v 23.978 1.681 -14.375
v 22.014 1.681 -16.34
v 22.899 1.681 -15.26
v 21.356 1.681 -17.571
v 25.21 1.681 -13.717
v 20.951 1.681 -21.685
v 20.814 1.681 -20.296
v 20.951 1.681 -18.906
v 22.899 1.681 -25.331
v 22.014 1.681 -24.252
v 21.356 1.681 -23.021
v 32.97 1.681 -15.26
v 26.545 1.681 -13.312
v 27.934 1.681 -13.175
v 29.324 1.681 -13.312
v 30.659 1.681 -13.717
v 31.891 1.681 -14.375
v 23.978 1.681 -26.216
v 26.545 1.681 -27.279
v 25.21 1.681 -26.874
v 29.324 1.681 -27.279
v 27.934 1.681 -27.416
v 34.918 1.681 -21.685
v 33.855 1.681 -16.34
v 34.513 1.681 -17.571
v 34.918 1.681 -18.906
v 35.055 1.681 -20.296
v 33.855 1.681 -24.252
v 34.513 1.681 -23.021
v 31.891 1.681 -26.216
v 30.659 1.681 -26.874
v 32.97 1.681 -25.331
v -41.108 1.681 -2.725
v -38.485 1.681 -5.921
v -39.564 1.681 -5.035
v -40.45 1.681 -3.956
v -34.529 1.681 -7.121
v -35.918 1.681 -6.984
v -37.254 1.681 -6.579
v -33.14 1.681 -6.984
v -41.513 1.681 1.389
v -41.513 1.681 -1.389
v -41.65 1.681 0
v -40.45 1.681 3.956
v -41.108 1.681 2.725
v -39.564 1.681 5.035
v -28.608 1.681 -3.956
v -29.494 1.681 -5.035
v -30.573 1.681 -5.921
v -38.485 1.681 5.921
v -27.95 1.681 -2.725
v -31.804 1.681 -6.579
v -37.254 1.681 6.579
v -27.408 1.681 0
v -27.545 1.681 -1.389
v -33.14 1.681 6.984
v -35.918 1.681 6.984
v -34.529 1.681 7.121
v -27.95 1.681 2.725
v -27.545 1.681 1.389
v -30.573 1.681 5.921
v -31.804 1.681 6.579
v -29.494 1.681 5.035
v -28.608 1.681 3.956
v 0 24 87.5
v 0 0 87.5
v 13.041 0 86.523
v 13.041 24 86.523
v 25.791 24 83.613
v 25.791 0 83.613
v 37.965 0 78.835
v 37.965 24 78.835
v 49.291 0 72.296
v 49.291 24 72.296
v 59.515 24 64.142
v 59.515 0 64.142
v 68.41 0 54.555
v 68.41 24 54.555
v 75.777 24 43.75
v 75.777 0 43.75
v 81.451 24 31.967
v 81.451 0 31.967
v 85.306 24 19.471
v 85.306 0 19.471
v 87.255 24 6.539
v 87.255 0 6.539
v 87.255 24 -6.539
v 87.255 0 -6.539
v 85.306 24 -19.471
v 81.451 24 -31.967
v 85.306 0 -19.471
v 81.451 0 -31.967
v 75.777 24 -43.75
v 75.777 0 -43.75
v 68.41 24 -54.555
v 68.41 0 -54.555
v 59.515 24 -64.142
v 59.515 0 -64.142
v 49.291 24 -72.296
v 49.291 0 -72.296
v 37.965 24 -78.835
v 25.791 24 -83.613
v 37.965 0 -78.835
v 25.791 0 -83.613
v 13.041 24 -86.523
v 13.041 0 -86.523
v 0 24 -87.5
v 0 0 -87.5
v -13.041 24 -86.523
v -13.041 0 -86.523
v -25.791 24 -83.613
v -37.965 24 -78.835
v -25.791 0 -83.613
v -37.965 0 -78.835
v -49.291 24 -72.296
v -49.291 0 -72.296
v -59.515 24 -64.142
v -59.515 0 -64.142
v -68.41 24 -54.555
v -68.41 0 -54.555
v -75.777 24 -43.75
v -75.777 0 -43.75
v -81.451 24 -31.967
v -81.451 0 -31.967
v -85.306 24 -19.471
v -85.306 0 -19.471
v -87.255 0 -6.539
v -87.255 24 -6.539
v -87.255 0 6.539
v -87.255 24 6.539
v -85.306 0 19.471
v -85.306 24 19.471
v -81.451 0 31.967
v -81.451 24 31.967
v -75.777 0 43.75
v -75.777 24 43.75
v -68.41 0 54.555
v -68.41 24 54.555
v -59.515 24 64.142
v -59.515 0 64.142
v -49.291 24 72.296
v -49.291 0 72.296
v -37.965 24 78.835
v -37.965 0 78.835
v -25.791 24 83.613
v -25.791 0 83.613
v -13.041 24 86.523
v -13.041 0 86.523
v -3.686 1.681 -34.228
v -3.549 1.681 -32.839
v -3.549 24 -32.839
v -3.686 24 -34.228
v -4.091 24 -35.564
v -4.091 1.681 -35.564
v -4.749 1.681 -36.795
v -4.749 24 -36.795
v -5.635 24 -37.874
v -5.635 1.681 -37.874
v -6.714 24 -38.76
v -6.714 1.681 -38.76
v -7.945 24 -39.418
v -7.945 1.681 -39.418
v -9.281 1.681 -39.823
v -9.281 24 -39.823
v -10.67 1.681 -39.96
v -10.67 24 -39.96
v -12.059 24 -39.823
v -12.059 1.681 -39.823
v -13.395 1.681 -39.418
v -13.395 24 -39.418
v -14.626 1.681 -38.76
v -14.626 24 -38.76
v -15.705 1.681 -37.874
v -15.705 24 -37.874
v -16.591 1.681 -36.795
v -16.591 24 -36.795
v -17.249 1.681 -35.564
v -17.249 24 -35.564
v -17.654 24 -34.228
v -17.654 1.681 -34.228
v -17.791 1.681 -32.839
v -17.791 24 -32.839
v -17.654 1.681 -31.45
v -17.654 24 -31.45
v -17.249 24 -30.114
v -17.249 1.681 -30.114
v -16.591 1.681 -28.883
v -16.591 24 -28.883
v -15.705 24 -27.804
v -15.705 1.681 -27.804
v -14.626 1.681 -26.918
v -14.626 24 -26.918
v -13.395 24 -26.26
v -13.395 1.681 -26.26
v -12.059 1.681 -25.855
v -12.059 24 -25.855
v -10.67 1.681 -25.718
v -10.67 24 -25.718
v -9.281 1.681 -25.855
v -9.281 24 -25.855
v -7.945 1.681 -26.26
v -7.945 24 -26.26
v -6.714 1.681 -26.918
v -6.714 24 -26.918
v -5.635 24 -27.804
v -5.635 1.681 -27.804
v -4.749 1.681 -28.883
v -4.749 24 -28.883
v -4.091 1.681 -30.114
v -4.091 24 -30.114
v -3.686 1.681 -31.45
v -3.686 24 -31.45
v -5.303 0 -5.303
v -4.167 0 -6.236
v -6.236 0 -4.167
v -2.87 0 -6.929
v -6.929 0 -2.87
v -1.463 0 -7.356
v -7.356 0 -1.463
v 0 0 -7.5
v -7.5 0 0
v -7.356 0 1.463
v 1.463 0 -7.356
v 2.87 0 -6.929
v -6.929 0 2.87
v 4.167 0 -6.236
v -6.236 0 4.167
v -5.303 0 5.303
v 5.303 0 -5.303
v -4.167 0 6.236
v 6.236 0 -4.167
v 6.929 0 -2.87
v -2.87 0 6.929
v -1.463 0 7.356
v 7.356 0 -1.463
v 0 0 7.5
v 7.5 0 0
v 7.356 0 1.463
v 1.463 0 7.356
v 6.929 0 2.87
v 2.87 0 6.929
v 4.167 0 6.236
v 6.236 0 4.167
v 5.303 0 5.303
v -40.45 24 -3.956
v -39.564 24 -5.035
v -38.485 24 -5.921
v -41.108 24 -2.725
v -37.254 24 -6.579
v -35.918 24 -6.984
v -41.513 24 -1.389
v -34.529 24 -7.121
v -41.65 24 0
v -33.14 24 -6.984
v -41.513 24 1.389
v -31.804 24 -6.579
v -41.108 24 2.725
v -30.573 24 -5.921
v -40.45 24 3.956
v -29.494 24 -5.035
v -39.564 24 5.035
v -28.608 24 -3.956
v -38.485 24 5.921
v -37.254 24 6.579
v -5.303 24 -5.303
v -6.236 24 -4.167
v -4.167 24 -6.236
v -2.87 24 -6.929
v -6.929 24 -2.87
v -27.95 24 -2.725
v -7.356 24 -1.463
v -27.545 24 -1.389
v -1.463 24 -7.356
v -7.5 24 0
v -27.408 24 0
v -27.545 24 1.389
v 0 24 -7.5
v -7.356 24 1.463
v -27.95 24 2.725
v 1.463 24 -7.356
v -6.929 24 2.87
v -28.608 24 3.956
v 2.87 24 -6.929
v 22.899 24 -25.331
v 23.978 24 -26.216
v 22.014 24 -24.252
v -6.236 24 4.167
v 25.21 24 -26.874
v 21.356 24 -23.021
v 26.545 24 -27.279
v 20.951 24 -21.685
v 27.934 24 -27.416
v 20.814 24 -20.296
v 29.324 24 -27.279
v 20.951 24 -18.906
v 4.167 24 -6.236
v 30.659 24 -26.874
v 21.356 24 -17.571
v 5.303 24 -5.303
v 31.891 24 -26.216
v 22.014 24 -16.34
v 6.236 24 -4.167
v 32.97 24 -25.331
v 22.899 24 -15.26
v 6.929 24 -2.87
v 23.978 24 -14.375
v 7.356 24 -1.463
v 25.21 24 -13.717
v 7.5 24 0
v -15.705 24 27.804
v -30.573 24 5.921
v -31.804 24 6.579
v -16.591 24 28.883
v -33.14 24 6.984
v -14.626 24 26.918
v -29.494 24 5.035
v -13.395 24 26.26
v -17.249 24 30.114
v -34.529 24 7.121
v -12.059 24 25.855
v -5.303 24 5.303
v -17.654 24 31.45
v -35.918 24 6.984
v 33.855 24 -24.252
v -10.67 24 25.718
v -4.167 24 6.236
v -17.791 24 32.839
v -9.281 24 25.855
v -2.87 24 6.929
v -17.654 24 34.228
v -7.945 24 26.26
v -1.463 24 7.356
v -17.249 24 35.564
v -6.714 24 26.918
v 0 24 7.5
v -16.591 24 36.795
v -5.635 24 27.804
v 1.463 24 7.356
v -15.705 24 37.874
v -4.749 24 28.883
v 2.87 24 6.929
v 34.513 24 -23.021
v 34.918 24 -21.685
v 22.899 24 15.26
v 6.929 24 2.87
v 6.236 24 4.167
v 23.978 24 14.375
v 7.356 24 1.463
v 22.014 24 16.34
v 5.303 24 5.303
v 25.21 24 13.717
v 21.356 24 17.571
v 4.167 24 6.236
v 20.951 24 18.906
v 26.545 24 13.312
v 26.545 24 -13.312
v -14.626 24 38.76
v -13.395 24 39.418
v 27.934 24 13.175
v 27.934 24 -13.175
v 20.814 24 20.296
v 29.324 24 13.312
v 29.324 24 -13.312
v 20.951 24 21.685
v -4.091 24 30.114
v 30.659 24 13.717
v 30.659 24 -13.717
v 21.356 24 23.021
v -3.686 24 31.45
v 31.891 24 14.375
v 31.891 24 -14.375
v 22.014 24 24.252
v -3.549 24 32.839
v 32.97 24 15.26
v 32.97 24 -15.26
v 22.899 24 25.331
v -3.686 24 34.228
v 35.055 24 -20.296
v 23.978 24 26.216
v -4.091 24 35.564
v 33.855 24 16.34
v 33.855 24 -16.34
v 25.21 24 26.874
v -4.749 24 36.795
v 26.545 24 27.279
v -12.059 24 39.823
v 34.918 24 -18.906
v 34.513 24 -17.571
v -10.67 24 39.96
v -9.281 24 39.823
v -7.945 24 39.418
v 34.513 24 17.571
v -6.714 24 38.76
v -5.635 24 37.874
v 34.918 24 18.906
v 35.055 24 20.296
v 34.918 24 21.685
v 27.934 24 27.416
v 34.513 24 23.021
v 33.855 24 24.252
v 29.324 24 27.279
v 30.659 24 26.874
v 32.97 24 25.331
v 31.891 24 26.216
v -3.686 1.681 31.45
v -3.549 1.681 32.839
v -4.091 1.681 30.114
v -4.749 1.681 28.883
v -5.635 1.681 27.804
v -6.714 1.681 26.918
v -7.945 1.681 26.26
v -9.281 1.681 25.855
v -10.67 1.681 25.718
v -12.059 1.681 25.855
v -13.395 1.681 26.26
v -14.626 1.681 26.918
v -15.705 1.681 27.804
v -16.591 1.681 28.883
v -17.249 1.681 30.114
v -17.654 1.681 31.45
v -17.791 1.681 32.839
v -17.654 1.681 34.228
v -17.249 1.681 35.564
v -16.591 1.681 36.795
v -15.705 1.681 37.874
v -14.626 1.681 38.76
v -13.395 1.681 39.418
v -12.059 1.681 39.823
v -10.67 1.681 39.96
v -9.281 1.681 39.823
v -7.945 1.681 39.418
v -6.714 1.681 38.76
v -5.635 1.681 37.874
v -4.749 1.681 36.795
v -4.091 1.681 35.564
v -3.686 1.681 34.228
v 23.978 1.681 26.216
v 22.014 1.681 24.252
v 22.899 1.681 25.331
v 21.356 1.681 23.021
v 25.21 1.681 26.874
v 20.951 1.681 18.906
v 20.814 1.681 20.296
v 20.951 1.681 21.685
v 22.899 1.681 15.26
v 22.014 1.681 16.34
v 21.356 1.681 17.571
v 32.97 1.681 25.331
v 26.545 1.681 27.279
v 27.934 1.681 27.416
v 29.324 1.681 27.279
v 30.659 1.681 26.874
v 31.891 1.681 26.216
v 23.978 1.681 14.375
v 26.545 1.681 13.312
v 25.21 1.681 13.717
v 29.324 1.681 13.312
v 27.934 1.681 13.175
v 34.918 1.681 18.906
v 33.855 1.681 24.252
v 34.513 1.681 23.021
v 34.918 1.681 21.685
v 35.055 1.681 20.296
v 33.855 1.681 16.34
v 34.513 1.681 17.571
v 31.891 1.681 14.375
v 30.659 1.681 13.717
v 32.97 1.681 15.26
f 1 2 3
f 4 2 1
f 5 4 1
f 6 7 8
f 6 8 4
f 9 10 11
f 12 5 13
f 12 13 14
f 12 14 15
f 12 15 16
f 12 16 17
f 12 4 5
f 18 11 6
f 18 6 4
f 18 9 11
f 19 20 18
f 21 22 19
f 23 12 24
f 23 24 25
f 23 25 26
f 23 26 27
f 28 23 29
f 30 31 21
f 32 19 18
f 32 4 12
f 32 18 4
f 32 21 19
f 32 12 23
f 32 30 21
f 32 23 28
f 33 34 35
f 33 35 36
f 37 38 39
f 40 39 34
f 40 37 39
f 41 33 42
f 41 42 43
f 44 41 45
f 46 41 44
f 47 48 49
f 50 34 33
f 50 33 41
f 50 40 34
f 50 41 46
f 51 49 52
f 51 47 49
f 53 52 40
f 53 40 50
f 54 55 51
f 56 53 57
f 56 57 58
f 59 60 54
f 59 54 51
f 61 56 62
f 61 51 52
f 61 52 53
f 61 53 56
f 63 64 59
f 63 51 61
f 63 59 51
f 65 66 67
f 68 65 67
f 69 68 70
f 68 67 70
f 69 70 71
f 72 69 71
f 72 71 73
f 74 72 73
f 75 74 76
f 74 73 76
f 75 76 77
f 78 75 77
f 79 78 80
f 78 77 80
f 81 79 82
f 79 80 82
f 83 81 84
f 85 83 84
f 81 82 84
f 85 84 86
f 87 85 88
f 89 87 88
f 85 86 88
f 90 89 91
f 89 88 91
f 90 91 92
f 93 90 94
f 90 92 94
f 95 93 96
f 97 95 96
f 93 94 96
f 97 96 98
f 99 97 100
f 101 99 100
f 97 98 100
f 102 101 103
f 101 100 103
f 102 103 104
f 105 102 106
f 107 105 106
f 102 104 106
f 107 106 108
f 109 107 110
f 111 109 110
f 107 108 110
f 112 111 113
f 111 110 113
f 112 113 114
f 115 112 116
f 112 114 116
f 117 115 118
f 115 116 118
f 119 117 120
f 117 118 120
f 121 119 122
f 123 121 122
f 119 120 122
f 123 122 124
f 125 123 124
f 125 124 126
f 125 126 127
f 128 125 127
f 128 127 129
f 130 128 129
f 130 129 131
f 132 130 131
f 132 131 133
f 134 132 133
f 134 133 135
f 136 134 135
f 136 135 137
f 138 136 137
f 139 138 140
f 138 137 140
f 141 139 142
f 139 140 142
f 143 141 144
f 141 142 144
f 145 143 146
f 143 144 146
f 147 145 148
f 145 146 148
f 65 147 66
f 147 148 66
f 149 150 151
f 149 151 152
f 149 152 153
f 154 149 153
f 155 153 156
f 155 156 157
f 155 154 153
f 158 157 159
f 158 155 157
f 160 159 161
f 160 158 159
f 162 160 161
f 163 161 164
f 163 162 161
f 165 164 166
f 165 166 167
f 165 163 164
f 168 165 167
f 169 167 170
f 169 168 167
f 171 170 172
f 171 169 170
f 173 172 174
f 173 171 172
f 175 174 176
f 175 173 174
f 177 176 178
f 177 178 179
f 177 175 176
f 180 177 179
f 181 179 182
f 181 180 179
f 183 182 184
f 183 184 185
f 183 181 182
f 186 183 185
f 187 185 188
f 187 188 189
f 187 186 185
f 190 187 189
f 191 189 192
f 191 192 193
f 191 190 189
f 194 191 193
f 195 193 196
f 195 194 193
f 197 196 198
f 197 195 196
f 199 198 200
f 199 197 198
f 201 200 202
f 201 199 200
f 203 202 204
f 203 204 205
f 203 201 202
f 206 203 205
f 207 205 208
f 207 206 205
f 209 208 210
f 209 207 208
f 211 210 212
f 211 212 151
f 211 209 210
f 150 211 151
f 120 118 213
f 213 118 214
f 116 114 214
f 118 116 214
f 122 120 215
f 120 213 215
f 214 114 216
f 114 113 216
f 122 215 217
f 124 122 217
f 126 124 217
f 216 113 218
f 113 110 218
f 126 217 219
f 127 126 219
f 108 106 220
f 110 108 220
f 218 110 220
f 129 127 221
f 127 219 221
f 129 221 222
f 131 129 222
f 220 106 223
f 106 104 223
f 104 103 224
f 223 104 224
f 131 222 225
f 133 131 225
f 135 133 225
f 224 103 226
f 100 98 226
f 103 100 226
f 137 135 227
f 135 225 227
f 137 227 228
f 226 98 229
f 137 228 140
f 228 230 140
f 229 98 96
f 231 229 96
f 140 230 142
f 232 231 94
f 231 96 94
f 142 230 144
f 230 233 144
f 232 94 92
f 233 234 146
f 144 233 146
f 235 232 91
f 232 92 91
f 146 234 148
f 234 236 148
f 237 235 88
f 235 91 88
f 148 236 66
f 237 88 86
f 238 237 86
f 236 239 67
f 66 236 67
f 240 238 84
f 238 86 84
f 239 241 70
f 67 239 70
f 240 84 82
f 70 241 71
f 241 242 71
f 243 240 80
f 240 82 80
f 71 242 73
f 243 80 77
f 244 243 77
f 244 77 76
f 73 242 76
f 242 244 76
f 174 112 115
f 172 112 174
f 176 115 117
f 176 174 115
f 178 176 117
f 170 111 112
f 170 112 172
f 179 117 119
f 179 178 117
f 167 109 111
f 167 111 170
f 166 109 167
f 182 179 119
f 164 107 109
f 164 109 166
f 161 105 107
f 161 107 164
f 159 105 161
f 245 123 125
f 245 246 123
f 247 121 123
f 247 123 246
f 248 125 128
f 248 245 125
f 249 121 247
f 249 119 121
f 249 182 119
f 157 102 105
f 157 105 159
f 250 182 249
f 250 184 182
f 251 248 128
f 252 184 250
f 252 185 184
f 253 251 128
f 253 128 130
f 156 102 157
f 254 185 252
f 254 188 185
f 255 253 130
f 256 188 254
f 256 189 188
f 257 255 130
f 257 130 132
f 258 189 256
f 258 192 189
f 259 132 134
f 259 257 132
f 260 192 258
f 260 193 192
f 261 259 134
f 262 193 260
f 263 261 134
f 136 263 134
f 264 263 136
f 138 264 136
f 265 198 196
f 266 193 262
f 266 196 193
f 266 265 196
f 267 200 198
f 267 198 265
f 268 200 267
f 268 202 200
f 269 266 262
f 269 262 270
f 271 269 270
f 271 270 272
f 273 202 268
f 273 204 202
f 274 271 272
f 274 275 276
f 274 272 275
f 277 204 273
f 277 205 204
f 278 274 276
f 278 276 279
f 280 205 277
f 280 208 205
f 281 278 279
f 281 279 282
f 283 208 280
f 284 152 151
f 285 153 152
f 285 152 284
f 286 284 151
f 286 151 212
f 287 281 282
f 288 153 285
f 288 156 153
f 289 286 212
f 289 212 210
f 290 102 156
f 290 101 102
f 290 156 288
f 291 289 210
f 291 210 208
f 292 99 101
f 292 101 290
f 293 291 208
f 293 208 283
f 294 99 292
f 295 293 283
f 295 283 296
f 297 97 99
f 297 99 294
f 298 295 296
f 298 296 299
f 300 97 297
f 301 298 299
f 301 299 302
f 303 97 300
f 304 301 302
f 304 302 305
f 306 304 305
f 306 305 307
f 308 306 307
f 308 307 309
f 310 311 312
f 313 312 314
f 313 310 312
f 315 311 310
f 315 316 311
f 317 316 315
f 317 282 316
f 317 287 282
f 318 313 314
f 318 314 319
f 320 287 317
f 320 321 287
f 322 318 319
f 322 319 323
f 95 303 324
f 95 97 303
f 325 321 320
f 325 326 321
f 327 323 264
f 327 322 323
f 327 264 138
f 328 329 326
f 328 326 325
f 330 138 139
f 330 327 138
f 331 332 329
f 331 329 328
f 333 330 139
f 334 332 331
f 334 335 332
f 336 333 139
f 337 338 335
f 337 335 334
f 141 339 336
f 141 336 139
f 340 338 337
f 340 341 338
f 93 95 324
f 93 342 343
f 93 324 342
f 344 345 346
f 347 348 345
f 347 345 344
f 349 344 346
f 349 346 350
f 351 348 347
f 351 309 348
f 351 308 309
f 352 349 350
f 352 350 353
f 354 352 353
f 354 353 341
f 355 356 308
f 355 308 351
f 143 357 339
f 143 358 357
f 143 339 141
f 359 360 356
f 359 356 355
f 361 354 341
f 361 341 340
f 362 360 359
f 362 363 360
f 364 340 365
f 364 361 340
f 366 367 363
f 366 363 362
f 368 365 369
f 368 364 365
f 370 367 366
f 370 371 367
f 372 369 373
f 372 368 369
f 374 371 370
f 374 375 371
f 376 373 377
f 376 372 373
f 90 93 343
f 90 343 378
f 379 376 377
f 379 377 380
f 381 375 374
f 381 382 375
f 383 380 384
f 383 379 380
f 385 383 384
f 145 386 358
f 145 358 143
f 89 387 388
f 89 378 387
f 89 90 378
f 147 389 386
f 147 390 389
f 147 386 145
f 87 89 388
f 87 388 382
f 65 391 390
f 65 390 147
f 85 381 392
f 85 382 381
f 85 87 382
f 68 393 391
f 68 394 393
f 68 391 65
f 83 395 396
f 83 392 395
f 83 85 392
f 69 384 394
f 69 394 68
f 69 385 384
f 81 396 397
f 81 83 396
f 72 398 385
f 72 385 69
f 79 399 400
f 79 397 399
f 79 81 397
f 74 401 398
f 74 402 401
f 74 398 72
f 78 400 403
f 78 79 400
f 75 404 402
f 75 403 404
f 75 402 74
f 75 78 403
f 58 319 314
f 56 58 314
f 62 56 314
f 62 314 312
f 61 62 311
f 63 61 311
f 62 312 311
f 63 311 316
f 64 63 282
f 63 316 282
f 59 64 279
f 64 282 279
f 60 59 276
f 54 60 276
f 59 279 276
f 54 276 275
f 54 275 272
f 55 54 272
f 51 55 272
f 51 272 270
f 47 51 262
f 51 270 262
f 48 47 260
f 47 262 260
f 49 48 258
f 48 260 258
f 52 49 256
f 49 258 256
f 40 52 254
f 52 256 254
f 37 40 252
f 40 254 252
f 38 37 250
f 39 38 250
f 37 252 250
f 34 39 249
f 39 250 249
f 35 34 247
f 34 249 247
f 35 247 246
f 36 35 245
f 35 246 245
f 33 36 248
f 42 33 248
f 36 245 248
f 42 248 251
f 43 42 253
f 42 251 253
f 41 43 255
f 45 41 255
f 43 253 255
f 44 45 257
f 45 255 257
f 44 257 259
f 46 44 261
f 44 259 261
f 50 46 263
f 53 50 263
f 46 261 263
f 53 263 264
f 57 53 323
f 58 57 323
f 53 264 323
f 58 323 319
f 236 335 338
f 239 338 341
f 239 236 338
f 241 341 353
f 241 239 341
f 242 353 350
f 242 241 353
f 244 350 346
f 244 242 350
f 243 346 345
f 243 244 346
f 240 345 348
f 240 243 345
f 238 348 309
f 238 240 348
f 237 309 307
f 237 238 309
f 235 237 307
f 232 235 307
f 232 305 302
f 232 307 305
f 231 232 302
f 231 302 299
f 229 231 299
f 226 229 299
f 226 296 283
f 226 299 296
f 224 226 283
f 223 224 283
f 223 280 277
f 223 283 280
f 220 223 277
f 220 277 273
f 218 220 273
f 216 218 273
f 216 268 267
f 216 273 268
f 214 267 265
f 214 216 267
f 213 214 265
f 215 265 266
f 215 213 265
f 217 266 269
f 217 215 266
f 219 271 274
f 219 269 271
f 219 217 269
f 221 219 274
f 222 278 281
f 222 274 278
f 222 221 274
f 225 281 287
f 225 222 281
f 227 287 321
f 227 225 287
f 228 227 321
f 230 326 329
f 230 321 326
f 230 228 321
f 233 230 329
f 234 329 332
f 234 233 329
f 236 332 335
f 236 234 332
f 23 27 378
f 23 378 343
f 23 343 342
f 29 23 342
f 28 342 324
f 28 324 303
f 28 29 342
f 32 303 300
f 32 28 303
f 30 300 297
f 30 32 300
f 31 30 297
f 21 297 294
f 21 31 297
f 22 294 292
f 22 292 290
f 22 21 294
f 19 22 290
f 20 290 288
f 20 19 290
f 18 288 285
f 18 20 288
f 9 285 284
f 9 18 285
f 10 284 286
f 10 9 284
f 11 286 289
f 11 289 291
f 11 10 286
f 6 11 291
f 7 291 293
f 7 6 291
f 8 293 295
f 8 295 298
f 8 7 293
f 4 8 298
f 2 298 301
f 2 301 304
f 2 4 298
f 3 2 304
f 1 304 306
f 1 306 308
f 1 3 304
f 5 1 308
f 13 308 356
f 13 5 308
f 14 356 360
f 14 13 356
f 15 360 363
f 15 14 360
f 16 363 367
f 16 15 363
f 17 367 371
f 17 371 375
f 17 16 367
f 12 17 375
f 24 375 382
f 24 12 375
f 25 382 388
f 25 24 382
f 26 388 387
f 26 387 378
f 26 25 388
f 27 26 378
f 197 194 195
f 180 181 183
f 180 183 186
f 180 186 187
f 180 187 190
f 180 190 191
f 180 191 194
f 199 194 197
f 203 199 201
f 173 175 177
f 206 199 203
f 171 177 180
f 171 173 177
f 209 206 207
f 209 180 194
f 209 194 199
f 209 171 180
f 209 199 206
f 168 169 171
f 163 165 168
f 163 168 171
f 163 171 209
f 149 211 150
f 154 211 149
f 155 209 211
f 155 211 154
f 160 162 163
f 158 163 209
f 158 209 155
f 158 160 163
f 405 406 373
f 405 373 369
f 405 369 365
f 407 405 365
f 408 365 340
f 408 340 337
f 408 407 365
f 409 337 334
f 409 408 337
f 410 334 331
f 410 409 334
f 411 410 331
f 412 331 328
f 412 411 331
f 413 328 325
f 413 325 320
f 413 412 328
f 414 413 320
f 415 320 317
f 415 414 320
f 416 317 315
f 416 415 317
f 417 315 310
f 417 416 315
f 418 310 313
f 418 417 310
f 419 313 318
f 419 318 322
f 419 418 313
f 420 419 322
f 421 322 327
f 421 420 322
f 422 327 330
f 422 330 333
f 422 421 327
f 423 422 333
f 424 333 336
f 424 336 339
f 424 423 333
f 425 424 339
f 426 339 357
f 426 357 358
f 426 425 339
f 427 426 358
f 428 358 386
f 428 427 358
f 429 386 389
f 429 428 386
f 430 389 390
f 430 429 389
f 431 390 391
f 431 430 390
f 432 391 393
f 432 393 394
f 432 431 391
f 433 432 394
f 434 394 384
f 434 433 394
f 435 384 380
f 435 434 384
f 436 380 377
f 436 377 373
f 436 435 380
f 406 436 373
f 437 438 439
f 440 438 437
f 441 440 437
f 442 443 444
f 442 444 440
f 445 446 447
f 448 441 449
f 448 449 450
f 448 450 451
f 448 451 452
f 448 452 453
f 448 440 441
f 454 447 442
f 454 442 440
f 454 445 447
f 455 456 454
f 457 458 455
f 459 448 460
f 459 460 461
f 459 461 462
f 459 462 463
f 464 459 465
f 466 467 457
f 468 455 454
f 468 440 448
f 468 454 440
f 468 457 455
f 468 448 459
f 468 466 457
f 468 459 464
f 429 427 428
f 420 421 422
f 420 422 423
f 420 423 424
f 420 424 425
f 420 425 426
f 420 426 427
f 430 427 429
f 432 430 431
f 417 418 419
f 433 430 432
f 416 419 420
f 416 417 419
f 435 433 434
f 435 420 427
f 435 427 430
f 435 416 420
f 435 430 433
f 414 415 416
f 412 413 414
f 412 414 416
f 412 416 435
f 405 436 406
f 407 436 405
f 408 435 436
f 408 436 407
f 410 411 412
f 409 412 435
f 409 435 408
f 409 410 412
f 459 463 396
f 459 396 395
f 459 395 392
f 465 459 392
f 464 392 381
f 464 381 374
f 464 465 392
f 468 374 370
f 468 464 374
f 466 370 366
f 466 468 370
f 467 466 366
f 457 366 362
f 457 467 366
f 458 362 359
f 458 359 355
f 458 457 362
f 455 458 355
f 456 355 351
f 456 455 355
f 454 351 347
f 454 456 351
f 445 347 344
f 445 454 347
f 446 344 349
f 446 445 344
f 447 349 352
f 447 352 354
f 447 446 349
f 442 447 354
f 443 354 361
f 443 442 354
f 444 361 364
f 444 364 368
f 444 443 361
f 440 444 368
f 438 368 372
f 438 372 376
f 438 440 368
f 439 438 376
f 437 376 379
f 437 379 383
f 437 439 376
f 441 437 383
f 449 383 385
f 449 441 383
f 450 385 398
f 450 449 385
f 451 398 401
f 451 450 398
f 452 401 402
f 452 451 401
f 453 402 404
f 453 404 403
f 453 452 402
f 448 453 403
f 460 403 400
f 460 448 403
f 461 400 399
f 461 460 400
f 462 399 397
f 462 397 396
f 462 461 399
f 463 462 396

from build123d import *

# Parameters (mm, degrees)
SKETCH1_R           = 87.5
BOSS_EXTRUDE1_DEPTH = 24
SKETCH2_R           = 7.5
CUT_EXTRUDE1_DEPTH  = 127.049593415
SKETCH3_R           = 7.120707896
CUT_EXTRUDE2_DEPTH  = 22.318548442
CIRPATTERN1_COUNT   = 5


with BuildPart() as part:
    # Sketch1 → Boss-Extrude1 (new body)
    with BuildSketch(Plane(origin=(0, 0, 0), x_dir=(1, 0, 0), z_dir=(0, 1, 0))):
        Circle(SKETCH1_R)
    extrude(amount=BOSS_EXTRUDE1_DEPTH)

    # Sketch2 → Cut-Extrude1 (cut, through all)
    with BuildSketch(Plane(origin=(0, 0, 0), x_dir=(1, 0, 0), z_dir=(0, 1, 0))):
        Circle(SKETCH2_R)
    extrude(amount=CUT_EXTRUDE1_DEPTH, mode=Mode.SUBTRACT)

    # Sketch3 → Cut-Extrude2 (cut)
    with BuildSketch(Plane(origin=(0, 24, 0), x_dir=(1, 0, 0), z_dir=(0, 1, 0))):
        with Locations((-34.52893475, 0)):
            Circle(SKETCH3_R)
    cut_extrude2 = extrude(amount=-CUT_EXTRUDE2_DEPTH, mode=Mode.SUBTRACT)

    # CirPattern1: Cut-Extrude2 ×5 about axis
    cirpattern1_axis = Axis((0, 0, 0), (0, 1, 0))
    for i in range(1, CIRPATTERN1_COUNT):
        add(cut_extrude2.rotate(cirpattern1_axis, i * 360 / CIRPATTERN1_COUNT), mode=Mode.SUBTRACT)


solid = part.part
